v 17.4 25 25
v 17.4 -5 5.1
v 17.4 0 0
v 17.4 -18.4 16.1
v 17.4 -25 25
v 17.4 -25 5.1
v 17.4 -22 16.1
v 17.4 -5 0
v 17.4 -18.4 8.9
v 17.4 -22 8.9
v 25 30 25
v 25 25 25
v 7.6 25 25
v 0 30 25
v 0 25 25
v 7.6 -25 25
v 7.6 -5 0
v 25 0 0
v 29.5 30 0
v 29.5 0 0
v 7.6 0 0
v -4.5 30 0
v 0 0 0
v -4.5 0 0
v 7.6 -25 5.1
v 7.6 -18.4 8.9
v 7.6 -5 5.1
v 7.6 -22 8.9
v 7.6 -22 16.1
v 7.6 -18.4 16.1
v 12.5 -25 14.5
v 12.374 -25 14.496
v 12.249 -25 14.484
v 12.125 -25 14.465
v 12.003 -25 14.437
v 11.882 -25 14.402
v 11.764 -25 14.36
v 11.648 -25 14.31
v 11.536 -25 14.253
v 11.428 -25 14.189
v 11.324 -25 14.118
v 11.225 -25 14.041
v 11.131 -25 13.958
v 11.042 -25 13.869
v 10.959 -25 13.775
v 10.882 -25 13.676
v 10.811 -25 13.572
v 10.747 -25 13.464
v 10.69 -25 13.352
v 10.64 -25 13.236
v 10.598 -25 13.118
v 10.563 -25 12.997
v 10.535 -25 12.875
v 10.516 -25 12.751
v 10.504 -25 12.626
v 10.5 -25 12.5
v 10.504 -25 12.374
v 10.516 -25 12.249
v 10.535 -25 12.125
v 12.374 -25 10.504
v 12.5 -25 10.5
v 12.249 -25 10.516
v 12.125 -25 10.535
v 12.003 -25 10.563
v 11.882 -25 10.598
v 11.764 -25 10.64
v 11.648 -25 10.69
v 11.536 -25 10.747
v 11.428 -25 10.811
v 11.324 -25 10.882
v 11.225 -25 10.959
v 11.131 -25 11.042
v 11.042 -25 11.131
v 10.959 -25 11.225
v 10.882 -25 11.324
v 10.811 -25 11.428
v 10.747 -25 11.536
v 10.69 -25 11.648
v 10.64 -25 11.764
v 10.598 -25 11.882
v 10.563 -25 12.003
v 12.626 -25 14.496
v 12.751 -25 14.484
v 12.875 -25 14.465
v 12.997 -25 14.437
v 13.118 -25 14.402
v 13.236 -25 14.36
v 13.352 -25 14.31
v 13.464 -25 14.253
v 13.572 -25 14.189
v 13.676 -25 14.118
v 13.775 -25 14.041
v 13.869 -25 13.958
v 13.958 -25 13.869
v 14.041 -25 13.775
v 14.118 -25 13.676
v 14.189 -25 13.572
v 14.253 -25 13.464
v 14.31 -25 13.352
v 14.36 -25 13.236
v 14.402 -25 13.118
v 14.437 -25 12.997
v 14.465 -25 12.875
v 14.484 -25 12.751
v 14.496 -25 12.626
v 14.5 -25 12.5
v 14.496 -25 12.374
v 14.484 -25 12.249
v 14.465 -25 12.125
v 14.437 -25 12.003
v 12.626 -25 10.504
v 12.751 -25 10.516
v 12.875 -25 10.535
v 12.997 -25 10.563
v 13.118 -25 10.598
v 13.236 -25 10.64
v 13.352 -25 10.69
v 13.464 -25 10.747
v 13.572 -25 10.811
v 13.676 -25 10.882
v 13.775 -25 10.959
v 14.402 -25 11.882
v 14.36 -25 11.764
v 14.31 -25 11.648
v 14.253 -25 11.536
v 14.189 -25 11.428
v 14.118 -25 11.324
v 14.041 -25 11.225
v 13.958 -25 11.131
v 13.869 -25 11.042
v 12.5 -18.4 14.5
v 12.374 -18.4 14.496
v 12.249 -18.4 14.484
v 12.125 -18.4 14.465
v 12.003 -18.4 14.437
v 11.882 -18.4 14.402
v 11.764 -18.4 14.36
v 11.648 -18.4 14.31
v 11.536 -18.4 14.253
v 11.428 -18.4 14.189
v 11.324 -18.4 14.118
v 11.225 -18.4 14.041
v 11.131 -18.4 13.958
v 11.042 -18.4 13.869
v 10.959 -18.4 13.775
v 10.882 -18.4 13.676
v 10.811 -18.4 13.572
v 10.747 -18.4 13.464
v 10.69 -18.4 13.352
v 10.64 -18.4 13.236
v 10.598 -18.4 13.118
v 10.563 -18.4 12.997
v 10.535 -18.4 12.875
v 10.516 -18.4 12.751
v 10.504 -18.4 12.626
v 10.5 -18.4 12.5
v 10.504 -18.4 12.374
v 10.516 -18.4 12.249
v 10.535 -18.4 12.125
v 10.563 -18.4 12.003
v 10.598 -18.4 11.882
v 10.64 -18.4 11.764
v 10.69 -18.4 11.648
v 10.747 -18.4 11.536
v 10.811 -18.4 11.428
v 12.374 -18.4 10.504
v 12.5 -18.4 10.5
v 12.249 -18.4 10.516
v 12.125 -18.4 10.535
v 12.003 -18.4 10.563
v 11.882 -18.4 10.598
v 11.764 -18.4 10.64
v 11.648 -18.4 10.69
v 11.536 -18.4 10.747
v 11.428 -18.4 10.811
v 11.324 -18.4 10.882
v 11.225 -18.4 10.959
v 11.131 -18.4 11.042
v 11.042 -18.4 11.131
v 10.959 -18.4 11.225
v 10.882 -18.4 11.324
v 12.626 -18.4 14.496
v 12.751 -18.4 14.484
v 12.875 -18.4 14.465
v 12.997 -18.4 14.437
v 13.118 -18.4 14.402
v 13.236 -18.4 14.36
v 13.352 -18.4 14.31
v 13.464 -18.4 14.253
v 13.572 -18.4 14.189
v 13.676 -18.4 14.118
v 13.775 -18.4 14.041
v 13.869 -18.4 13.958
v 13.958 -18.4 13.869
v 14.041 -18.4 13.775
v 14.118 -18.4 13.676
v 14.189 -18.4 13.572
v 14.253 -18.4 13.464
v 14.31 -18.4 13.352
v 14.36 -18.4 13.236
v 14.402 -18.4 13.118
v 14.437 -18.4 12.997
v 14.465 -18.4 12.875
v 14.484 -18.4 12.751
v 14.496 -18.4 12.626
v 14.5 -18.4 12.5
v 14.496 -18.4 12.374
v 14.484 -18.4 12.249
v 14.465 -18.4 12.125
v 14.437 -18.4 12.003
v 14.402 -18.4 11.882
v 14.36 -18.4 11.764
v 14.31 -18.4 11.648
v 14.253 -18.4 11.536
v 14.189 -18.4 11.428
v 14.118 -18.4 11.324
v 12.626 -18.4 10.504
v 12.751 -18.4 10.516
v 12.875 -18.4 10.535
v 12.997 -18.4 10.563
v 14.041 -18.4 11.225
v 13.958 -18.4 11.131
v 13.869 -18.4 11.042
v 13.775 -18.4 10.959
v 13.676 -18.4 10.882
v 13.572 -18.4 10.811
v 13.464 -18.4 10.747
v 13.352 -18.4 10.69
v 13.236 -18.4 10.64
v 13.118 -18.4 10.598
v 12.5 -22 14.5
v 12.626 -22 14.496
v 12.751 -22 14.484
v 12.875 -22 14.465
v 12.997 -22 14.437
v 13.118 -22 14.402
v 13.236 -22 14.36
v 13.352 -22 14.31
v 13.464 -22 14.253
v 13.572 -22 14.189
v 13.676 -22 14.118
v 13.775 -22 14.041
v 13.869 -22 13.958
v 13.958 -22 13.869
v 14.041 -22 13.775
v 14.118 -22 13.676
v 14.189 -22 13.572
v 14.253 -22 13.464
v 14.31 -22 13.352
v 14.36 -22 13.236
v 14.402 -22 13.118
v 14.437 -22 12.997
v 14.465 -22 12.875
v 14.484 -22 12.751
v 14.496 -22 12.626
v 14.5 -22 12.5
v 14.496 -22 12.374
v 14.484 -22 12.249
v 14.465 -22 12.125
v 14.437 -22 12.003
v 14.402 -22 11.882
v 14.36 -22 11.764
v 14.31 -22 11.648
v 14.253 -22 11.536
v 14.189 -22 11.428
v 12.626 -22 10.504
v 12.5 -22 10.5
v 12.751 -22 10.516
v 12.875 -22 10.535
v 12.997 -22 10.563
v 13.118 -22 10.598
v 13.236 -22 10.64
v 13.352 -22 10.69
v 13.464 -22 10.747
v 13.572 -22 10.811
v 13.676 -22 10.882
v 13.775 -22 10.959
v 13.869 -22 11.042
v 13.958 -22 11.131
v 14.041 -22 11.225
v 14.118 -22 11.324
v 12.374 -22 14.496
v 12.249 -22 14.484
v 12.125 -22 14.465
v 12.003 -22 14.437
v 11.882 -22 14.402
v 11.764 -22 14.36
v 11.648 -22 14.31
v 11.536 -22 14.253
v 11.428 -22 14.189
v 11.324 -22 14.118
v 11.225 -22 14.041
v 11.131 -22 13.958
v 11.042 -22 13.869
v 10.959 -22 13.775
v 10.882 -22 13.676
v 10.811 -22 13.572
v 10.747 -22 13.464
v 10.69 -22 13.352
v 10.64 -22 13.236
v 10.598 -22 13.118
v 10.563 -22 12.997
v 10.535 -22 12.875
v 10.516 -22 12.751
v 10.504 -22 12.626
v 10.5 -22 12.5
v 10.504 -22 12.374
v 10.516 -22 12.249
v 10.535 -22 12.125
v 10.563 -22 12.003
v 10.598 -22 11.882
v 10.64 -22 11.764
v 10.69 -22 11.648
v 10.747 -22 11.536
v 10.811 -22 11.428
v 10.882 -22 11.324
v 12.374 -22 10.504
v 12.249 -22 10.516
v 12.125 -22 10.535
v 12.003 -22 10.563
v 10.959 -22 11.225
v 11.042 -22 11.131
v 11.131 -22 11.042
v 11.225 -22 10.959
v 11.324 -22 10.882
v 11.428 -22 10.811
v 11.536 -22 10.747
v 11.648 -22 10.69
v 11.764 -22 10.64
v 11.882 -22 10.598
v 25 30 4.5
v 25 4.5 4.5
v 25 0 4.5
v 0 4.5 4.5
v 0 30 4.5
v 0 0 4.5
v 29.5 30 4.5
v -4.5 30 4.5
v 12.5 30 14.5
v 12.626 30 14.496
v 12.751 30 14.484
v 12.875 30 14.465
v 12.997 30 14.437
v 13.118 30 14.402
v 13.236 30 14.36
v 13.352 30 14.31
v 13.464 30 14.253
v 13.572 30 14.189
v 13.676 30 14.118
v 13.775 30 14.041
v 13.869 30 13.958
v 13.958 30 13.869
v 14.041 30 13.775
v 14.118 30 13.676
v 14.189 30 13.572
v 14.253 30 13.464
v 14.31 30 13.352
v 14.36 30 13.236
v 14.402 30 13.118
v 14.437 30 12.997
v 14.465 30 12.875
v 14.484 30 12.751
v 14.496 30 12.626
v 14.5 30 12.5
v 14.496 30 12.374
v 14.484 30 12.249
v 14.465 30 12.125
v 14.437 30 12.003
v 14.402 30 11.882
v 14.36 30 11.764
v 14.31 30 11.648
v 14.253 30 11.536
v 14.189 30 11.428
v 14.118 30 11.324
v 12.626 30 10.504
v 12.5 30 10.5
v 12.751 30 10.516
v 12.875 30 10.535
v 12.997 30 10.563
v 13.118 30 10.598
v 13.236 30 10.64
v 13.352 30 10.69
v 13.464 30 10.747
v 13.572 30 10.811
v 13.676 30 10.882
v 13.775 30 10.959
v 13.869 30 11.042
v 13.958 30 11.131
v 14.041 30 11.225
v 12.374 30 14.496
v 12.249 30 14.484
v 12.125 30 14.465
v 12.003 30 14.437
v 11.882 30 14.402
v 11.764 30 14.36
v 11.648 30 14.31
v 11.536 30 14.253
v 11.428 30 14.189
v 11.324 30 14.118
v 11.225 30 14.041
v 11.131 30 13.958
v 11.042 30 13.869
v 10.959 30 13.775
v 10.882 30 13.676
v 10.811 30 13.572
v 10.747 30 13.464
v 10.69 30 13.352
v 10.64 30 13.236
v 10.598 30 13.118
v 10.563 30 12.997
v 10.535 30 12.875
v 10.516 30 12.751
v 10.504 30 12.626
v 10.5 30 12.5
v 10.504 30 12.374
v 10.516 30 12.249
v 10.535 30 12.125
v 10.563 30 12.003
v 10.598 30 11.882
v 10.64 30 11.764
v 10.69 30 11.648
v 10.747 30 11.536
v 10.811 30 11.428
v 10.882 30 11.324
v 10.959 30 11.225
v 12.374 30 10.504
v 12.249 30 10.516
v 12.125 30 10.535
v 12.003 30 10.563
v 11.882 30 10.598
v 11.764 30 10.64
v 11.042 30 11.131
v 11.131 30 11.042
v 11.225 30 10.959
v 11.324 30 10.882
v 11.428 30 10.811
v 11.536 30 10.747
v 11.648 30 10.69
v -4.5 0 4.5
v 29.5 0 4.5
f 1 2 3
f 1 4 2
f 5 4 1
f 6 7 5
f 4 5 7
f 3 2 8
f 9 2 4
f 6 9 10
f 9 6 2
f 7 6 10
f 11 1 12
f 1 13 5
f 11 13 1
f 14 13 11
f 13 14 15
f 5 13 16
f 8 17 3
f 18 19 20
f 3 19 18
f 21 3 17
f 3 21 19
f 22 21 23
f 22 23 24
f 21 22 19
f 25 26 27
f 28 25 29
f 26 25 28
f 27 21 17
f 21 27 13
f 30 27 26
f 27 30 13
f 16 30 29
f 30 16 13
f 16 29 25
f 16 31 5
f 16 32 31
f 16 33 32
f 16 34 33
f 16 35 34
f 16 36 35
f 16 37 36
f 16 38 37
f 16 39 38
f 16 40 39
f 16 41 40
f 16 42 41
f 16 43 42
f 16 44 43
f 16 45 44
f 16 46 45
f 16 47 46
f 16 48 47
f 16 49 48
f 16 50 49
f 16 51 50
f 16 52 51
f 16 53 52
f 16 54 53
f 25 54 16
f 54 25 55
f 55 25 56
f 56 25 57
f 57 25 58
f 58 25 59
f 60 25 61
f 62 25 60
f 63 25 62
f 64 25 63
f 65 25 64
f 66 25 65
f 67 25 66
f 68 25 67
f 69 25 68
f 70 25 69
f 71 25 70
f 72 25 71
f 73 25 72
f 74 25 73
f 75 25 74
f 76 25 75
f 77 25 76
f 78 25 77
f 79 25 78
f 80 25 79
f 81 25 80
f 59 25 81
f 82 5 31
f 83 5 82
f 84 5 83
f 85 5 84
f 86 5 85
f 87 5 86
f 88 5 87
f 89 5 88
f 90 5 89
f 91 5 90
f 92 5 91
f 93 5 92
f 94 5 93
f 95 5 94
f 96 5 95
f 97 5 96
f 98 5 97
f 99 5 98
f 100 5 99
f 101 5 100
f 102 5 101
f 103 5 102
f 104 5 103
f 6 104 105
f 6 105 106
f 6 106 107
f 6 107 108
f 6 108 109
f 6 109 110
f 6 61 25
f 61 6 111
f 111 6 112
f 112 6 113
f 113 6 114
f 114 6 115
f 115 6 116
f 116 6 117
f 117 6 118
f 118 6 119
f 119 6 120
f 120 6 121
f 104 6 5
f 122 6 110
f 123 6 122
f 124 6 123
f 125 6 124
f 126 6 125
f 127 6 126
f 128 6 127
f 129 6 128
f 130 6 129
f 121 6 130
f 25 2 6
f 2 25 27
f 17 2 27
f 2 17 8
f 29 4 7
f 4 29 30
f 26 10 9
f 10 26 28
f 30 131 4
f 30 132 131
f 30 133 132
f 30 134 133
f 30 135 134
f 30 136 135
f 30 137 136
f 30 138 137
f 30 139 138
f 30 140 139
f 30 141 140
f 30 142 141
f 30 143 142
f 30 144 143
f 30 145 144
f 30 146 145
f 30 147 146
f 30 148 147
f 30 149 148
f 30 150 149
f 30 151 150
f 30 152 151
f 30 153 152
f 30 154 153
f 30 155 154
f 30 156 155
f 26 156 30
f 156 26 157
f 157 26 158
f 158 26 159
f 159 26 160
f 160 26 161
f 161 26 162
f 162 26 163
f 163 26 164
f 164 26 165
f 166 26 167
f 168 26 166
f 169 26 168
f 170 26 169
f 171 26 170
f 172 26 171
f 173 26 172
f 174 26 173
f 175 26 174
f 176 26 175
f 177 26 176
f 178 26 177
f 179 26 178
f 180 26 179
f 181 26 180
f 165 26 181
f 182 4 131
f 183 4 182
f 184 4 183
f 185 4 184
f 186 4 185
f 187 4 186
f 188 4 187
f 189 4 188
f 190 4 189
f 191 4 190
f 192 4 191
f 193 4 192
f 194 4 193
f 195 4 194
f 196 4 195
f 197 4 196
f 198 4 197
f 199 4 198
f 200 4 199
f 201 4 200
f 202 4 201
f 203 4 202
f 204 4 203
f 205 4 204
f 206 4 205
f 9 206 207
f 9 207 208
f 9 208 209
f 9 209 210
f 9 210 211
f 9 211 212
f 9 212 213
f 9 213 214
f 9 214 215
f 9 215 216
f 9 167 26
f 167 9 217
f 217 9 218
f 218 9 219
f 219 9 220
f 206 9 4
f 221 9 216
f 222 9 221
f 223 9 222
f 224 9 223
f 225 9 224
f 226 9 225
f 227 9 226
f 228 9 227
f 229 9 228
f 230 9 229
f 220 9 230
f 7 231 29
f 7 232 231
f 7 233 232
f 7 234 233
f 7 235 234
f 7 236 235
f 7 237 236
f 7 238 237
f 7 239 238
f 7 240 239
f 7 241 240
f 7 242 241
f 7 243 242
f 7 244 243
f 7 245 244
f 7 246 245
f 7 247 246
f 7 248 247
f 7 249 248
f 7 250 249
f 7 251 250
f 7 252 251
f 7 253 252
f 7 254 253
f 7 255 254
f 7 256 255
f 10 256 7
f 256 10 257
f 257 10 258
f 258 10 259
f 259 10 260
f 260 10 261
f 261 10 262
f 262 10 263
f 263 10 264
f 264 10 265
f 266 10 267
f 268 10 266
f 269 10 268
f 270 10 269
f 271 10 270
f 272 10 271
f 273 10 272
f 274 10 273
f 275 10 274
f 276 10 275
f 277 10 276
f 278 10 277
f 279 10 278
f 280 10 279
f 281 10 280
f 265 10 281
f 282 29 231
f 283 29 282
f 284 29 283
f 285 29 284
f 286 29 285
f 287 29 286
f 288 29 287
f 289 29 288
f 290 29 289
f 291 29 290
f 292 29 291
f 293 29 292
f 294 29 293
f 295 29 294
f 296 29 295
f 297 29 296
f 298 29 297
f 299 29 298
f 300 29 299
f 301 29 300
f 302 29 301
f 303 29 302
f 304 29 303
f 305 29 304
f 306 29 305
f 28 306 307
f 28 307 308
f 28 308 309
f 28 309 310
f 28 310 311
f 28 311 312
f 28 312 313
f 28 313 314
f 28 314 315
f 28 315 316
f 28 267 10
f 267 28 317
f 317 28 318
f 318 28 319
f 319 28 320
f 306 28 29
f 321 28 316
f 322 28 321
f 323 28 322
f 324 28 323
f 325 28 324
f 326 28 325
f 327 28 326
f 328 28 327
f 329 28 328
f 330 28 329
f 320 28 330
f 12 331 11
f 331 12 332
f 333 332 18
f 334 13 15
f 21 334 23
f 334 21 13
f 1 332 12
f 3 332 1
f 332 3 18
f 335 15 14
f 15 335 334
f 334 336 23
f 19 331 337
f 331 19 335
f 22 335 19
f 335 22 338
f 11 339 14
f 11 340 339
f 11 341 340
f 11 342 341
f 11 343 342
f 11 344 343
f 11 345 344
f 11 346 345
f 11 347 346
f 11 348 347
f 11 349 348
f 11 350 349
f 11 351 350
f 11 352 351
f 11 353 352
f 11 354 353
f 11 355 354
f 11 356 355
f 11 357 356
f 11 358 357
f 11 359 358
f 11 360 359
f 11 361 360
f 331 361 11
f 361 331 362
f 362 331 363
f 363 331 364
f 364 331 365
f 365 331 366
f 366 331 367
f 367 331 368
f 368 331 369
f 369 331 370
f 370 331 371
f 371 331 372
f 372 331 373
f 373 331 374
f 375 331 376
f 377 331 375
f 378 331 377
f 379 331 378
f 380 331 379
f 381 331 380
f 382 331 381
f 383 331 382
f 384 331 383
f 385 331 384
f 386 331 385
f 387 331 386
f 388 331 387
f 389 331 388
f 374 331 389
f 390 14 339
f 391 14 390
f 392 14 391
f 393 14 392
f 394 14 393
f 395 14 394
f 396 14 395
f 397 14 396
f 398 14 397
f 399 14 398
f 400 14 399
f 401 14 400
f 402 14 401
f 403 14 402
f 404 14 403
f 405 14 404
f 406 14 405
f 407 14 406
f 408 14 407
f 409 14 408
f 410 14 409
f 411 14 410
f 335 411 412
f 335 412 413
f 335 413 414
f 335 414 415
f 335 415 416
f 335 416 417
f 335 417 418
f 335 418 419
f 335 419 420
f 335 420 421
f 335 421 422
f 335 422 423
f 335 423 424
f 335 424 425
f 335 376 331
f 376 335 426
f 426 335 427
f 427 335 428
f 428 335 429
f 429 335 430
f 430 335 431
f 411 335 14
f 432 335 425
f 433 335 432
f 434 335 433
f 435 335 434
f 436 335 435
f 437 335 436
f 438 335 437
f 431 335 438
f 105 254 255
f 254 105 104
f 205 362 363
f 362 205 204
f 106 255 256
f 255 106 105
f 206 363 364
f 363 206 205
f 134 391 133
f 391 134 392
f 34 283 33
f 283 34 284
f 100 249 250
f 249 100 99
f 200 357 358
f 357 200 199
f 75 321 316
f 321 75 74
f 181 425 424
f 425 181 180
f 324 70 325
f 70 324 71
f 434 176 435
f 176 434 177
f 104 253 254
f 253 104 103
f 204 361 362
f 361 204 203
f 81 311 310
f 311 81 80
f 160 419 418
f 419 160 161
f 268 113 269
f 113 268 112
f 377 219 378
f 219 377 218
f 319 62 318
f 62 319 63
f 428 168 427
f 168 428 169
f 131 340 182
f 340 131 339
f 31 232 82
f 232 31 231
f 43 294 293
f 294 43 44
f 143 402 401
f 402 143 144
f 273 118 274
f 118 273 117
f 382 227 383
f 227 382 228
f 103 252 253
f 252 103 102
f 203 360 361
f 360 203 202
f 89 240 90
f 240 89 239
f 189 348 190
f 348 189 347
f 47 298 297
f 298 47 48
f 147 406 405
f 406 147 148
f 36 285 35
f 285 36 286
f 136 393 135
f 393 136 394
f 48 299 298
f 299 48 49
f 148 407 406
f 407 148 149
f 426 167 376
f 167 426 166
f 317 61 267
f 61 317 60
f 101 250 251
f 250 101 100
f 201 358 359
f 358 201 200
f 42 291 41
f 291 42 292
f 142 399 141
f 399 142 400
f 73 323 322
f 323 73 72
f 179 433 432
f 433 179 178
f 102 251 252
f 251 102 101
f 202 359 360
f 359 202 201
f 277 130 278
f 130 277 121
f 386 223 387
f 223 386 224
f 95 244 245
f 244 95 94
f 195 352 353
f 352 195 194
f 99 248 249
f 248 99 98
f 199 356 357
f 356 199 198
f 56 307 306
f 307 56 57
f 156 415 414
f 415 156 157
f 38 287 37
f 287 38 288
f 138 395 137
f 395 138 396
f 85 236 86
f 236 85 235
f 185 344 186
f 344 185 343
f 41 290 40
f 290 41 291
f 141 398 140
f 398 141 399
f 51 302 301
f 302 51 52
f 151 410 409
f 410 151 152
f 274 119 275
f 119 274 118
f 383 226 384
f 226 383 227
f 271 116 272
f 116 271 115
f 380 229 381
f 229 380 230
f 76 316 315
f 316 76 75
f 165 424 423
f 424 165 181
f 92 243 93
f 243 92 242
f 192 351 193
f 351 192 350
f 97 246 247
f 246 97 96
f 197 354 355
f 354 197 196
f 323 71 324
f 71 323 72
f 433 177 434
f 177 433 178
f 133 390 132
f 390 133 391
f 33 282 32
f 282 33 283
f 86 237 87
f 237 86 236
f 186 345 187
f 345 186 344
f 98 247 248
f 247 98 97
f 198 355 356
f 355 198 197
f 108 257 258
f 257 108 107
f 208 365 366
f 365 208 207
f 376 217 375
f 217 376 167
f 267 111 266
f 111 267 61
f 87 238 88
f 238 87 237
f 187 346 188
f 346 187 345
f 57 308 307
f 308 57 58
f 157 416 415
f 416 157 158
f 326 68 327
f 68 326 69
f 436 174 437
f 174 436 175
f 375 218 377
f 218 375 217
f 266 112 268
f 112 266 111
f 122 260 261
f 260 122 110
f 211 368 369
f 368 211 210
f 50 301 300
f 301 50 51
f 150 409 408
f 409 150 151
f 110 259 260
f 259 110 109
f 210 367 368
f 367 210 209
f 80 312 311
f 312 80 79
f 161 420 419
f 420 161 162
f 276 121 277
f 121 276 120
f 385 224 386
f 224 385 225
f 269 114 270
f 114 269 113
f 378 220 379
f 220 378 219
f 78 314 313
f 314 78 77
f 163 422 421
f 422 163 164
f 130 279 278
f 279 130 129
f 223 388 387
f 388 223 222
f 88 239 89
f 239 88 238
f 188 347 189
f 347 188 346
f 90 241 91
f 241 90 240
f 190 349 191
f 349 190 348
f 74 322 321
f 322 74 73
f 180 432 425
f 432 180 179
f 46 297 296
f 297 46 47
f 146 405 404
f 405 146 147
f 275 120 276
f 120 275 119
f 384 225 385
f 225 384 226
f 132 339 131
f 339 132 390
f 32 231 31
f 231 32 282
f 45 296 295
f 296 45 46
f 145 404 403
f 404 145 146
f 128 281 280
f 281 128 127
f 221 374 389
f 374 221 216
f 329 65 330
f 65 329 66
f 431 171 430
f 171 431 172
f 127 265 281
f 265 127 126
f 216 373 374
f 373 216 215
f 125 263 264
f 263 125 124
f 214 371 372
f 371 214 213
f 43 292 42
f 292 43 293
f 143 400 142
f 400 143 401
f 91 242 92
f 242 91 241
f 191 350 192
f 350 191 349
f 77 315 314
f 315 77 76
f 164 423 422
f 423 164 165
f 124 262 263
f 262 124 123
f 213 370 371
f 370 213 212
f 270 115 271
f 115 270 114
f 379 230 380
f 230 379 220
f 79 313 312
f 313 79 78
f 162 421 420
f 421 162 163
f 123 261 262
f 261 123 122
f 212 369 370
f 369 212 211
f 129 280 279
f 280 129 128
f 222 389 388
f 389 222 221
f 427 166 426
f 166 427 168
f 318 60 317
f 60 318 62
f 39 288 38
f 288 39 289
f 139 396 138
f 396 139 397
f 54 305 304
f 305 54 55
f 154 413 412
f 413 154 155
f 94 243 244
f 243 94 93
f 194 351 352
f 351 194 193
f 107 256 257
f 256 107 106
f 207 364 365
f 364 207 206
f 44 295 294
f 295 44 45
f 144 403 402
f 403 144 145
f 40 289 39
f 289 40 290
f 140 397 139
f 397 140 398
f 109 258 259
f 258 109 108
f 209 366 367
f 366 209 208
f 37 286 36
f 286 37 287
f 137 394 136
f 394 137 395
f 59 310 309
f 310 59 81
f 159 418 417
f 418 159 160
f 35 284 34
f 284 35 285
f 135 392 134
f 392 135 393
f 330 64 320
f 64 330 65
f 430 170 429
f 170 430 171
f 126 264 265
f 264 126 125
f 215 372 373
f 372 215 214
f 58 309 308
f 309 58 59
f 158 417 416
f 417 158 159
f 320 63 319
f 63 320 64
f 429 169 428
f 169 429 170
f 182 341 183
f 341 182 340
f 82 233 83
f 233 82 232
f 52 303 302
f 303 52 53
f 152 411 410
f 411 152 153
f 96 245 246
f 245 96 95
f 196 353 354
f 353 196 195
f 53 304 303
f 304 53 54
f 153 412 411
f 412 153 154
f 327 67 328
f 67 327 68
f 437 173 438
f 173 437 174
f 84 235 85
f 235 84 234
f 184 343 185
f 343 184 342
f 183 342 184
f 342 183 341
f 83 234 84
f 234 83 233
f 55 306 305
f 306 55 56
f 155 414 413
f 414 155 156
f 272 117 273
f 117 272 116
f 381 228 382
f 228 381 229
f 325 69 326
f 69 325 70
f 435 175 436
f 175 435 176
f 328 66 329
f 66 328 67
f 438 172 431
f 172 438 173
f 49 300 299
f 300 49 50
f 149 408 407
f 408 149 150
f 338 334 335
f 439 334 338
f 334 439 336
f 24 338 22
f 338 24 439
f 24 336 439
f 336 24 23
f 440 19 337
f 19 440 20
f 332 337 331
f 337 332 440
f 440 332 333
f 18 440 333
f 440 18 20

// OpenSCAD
ridge_width = 9.8;
ridge_cutout_height = 5.1;
wedge_width = 25;
rail_guide_width = 4.5;
rail_guide_height = 4.5;

// m4 nut
nut_width = 7.2;
nut_height = 3.6;

module prism(l, w, h){
      polyhedron(//pt 0        1        2        3        4        5
              points=[[0,0,0], [l,0,0], [l,w,0], [0,w,0], [0,w,h], [l,w,h]],
              faces=[[0,1,2,3],[5,4,3,2],[0,4,5,1],[0,3,4],[5,2,1]]
              );
}
      
// wing notches to slide in rails
translate([-rail_guide_width, 0, 0]){
    cube([rail_guide_width, 30, rail_guide_height]);
}
translate([25, 0, 0]){
    cube([rail_guide_width, 30, rail_guide_height]);
}       


difference(){
    union(){
        // wedge
        prism(25, 25, 25);
        translate([0, 25, 0]) {
            cube([25, 5, 25]);
        }  

        // ridge
        translate([(wedge_width-ridge_width)/2, -25, 0]) {            
            difference(){
                cube([ridge_width, 50, 25]);
                // bottom cutout
                translate([-0.1, -0.1, -1]){
                    cube([ridge_width+0.2, 20+0.1, ridge_cutout_height+1]);
                }                
                // m4 nut hole
                translate([-2, 3, 25/2-nut_width/2]) {
                    rotate([0, 0, 0]){
                        cube([25, nut_height, nut_width]);
                    }
                }
            }
        }
    }
    // m4 screw hole
    translate([25/2, 60, 25/2]) {
        rotate([90, 0, 0]) {
            cylinder(d=4, h=150, $fn=100);
        }
    }            
}
